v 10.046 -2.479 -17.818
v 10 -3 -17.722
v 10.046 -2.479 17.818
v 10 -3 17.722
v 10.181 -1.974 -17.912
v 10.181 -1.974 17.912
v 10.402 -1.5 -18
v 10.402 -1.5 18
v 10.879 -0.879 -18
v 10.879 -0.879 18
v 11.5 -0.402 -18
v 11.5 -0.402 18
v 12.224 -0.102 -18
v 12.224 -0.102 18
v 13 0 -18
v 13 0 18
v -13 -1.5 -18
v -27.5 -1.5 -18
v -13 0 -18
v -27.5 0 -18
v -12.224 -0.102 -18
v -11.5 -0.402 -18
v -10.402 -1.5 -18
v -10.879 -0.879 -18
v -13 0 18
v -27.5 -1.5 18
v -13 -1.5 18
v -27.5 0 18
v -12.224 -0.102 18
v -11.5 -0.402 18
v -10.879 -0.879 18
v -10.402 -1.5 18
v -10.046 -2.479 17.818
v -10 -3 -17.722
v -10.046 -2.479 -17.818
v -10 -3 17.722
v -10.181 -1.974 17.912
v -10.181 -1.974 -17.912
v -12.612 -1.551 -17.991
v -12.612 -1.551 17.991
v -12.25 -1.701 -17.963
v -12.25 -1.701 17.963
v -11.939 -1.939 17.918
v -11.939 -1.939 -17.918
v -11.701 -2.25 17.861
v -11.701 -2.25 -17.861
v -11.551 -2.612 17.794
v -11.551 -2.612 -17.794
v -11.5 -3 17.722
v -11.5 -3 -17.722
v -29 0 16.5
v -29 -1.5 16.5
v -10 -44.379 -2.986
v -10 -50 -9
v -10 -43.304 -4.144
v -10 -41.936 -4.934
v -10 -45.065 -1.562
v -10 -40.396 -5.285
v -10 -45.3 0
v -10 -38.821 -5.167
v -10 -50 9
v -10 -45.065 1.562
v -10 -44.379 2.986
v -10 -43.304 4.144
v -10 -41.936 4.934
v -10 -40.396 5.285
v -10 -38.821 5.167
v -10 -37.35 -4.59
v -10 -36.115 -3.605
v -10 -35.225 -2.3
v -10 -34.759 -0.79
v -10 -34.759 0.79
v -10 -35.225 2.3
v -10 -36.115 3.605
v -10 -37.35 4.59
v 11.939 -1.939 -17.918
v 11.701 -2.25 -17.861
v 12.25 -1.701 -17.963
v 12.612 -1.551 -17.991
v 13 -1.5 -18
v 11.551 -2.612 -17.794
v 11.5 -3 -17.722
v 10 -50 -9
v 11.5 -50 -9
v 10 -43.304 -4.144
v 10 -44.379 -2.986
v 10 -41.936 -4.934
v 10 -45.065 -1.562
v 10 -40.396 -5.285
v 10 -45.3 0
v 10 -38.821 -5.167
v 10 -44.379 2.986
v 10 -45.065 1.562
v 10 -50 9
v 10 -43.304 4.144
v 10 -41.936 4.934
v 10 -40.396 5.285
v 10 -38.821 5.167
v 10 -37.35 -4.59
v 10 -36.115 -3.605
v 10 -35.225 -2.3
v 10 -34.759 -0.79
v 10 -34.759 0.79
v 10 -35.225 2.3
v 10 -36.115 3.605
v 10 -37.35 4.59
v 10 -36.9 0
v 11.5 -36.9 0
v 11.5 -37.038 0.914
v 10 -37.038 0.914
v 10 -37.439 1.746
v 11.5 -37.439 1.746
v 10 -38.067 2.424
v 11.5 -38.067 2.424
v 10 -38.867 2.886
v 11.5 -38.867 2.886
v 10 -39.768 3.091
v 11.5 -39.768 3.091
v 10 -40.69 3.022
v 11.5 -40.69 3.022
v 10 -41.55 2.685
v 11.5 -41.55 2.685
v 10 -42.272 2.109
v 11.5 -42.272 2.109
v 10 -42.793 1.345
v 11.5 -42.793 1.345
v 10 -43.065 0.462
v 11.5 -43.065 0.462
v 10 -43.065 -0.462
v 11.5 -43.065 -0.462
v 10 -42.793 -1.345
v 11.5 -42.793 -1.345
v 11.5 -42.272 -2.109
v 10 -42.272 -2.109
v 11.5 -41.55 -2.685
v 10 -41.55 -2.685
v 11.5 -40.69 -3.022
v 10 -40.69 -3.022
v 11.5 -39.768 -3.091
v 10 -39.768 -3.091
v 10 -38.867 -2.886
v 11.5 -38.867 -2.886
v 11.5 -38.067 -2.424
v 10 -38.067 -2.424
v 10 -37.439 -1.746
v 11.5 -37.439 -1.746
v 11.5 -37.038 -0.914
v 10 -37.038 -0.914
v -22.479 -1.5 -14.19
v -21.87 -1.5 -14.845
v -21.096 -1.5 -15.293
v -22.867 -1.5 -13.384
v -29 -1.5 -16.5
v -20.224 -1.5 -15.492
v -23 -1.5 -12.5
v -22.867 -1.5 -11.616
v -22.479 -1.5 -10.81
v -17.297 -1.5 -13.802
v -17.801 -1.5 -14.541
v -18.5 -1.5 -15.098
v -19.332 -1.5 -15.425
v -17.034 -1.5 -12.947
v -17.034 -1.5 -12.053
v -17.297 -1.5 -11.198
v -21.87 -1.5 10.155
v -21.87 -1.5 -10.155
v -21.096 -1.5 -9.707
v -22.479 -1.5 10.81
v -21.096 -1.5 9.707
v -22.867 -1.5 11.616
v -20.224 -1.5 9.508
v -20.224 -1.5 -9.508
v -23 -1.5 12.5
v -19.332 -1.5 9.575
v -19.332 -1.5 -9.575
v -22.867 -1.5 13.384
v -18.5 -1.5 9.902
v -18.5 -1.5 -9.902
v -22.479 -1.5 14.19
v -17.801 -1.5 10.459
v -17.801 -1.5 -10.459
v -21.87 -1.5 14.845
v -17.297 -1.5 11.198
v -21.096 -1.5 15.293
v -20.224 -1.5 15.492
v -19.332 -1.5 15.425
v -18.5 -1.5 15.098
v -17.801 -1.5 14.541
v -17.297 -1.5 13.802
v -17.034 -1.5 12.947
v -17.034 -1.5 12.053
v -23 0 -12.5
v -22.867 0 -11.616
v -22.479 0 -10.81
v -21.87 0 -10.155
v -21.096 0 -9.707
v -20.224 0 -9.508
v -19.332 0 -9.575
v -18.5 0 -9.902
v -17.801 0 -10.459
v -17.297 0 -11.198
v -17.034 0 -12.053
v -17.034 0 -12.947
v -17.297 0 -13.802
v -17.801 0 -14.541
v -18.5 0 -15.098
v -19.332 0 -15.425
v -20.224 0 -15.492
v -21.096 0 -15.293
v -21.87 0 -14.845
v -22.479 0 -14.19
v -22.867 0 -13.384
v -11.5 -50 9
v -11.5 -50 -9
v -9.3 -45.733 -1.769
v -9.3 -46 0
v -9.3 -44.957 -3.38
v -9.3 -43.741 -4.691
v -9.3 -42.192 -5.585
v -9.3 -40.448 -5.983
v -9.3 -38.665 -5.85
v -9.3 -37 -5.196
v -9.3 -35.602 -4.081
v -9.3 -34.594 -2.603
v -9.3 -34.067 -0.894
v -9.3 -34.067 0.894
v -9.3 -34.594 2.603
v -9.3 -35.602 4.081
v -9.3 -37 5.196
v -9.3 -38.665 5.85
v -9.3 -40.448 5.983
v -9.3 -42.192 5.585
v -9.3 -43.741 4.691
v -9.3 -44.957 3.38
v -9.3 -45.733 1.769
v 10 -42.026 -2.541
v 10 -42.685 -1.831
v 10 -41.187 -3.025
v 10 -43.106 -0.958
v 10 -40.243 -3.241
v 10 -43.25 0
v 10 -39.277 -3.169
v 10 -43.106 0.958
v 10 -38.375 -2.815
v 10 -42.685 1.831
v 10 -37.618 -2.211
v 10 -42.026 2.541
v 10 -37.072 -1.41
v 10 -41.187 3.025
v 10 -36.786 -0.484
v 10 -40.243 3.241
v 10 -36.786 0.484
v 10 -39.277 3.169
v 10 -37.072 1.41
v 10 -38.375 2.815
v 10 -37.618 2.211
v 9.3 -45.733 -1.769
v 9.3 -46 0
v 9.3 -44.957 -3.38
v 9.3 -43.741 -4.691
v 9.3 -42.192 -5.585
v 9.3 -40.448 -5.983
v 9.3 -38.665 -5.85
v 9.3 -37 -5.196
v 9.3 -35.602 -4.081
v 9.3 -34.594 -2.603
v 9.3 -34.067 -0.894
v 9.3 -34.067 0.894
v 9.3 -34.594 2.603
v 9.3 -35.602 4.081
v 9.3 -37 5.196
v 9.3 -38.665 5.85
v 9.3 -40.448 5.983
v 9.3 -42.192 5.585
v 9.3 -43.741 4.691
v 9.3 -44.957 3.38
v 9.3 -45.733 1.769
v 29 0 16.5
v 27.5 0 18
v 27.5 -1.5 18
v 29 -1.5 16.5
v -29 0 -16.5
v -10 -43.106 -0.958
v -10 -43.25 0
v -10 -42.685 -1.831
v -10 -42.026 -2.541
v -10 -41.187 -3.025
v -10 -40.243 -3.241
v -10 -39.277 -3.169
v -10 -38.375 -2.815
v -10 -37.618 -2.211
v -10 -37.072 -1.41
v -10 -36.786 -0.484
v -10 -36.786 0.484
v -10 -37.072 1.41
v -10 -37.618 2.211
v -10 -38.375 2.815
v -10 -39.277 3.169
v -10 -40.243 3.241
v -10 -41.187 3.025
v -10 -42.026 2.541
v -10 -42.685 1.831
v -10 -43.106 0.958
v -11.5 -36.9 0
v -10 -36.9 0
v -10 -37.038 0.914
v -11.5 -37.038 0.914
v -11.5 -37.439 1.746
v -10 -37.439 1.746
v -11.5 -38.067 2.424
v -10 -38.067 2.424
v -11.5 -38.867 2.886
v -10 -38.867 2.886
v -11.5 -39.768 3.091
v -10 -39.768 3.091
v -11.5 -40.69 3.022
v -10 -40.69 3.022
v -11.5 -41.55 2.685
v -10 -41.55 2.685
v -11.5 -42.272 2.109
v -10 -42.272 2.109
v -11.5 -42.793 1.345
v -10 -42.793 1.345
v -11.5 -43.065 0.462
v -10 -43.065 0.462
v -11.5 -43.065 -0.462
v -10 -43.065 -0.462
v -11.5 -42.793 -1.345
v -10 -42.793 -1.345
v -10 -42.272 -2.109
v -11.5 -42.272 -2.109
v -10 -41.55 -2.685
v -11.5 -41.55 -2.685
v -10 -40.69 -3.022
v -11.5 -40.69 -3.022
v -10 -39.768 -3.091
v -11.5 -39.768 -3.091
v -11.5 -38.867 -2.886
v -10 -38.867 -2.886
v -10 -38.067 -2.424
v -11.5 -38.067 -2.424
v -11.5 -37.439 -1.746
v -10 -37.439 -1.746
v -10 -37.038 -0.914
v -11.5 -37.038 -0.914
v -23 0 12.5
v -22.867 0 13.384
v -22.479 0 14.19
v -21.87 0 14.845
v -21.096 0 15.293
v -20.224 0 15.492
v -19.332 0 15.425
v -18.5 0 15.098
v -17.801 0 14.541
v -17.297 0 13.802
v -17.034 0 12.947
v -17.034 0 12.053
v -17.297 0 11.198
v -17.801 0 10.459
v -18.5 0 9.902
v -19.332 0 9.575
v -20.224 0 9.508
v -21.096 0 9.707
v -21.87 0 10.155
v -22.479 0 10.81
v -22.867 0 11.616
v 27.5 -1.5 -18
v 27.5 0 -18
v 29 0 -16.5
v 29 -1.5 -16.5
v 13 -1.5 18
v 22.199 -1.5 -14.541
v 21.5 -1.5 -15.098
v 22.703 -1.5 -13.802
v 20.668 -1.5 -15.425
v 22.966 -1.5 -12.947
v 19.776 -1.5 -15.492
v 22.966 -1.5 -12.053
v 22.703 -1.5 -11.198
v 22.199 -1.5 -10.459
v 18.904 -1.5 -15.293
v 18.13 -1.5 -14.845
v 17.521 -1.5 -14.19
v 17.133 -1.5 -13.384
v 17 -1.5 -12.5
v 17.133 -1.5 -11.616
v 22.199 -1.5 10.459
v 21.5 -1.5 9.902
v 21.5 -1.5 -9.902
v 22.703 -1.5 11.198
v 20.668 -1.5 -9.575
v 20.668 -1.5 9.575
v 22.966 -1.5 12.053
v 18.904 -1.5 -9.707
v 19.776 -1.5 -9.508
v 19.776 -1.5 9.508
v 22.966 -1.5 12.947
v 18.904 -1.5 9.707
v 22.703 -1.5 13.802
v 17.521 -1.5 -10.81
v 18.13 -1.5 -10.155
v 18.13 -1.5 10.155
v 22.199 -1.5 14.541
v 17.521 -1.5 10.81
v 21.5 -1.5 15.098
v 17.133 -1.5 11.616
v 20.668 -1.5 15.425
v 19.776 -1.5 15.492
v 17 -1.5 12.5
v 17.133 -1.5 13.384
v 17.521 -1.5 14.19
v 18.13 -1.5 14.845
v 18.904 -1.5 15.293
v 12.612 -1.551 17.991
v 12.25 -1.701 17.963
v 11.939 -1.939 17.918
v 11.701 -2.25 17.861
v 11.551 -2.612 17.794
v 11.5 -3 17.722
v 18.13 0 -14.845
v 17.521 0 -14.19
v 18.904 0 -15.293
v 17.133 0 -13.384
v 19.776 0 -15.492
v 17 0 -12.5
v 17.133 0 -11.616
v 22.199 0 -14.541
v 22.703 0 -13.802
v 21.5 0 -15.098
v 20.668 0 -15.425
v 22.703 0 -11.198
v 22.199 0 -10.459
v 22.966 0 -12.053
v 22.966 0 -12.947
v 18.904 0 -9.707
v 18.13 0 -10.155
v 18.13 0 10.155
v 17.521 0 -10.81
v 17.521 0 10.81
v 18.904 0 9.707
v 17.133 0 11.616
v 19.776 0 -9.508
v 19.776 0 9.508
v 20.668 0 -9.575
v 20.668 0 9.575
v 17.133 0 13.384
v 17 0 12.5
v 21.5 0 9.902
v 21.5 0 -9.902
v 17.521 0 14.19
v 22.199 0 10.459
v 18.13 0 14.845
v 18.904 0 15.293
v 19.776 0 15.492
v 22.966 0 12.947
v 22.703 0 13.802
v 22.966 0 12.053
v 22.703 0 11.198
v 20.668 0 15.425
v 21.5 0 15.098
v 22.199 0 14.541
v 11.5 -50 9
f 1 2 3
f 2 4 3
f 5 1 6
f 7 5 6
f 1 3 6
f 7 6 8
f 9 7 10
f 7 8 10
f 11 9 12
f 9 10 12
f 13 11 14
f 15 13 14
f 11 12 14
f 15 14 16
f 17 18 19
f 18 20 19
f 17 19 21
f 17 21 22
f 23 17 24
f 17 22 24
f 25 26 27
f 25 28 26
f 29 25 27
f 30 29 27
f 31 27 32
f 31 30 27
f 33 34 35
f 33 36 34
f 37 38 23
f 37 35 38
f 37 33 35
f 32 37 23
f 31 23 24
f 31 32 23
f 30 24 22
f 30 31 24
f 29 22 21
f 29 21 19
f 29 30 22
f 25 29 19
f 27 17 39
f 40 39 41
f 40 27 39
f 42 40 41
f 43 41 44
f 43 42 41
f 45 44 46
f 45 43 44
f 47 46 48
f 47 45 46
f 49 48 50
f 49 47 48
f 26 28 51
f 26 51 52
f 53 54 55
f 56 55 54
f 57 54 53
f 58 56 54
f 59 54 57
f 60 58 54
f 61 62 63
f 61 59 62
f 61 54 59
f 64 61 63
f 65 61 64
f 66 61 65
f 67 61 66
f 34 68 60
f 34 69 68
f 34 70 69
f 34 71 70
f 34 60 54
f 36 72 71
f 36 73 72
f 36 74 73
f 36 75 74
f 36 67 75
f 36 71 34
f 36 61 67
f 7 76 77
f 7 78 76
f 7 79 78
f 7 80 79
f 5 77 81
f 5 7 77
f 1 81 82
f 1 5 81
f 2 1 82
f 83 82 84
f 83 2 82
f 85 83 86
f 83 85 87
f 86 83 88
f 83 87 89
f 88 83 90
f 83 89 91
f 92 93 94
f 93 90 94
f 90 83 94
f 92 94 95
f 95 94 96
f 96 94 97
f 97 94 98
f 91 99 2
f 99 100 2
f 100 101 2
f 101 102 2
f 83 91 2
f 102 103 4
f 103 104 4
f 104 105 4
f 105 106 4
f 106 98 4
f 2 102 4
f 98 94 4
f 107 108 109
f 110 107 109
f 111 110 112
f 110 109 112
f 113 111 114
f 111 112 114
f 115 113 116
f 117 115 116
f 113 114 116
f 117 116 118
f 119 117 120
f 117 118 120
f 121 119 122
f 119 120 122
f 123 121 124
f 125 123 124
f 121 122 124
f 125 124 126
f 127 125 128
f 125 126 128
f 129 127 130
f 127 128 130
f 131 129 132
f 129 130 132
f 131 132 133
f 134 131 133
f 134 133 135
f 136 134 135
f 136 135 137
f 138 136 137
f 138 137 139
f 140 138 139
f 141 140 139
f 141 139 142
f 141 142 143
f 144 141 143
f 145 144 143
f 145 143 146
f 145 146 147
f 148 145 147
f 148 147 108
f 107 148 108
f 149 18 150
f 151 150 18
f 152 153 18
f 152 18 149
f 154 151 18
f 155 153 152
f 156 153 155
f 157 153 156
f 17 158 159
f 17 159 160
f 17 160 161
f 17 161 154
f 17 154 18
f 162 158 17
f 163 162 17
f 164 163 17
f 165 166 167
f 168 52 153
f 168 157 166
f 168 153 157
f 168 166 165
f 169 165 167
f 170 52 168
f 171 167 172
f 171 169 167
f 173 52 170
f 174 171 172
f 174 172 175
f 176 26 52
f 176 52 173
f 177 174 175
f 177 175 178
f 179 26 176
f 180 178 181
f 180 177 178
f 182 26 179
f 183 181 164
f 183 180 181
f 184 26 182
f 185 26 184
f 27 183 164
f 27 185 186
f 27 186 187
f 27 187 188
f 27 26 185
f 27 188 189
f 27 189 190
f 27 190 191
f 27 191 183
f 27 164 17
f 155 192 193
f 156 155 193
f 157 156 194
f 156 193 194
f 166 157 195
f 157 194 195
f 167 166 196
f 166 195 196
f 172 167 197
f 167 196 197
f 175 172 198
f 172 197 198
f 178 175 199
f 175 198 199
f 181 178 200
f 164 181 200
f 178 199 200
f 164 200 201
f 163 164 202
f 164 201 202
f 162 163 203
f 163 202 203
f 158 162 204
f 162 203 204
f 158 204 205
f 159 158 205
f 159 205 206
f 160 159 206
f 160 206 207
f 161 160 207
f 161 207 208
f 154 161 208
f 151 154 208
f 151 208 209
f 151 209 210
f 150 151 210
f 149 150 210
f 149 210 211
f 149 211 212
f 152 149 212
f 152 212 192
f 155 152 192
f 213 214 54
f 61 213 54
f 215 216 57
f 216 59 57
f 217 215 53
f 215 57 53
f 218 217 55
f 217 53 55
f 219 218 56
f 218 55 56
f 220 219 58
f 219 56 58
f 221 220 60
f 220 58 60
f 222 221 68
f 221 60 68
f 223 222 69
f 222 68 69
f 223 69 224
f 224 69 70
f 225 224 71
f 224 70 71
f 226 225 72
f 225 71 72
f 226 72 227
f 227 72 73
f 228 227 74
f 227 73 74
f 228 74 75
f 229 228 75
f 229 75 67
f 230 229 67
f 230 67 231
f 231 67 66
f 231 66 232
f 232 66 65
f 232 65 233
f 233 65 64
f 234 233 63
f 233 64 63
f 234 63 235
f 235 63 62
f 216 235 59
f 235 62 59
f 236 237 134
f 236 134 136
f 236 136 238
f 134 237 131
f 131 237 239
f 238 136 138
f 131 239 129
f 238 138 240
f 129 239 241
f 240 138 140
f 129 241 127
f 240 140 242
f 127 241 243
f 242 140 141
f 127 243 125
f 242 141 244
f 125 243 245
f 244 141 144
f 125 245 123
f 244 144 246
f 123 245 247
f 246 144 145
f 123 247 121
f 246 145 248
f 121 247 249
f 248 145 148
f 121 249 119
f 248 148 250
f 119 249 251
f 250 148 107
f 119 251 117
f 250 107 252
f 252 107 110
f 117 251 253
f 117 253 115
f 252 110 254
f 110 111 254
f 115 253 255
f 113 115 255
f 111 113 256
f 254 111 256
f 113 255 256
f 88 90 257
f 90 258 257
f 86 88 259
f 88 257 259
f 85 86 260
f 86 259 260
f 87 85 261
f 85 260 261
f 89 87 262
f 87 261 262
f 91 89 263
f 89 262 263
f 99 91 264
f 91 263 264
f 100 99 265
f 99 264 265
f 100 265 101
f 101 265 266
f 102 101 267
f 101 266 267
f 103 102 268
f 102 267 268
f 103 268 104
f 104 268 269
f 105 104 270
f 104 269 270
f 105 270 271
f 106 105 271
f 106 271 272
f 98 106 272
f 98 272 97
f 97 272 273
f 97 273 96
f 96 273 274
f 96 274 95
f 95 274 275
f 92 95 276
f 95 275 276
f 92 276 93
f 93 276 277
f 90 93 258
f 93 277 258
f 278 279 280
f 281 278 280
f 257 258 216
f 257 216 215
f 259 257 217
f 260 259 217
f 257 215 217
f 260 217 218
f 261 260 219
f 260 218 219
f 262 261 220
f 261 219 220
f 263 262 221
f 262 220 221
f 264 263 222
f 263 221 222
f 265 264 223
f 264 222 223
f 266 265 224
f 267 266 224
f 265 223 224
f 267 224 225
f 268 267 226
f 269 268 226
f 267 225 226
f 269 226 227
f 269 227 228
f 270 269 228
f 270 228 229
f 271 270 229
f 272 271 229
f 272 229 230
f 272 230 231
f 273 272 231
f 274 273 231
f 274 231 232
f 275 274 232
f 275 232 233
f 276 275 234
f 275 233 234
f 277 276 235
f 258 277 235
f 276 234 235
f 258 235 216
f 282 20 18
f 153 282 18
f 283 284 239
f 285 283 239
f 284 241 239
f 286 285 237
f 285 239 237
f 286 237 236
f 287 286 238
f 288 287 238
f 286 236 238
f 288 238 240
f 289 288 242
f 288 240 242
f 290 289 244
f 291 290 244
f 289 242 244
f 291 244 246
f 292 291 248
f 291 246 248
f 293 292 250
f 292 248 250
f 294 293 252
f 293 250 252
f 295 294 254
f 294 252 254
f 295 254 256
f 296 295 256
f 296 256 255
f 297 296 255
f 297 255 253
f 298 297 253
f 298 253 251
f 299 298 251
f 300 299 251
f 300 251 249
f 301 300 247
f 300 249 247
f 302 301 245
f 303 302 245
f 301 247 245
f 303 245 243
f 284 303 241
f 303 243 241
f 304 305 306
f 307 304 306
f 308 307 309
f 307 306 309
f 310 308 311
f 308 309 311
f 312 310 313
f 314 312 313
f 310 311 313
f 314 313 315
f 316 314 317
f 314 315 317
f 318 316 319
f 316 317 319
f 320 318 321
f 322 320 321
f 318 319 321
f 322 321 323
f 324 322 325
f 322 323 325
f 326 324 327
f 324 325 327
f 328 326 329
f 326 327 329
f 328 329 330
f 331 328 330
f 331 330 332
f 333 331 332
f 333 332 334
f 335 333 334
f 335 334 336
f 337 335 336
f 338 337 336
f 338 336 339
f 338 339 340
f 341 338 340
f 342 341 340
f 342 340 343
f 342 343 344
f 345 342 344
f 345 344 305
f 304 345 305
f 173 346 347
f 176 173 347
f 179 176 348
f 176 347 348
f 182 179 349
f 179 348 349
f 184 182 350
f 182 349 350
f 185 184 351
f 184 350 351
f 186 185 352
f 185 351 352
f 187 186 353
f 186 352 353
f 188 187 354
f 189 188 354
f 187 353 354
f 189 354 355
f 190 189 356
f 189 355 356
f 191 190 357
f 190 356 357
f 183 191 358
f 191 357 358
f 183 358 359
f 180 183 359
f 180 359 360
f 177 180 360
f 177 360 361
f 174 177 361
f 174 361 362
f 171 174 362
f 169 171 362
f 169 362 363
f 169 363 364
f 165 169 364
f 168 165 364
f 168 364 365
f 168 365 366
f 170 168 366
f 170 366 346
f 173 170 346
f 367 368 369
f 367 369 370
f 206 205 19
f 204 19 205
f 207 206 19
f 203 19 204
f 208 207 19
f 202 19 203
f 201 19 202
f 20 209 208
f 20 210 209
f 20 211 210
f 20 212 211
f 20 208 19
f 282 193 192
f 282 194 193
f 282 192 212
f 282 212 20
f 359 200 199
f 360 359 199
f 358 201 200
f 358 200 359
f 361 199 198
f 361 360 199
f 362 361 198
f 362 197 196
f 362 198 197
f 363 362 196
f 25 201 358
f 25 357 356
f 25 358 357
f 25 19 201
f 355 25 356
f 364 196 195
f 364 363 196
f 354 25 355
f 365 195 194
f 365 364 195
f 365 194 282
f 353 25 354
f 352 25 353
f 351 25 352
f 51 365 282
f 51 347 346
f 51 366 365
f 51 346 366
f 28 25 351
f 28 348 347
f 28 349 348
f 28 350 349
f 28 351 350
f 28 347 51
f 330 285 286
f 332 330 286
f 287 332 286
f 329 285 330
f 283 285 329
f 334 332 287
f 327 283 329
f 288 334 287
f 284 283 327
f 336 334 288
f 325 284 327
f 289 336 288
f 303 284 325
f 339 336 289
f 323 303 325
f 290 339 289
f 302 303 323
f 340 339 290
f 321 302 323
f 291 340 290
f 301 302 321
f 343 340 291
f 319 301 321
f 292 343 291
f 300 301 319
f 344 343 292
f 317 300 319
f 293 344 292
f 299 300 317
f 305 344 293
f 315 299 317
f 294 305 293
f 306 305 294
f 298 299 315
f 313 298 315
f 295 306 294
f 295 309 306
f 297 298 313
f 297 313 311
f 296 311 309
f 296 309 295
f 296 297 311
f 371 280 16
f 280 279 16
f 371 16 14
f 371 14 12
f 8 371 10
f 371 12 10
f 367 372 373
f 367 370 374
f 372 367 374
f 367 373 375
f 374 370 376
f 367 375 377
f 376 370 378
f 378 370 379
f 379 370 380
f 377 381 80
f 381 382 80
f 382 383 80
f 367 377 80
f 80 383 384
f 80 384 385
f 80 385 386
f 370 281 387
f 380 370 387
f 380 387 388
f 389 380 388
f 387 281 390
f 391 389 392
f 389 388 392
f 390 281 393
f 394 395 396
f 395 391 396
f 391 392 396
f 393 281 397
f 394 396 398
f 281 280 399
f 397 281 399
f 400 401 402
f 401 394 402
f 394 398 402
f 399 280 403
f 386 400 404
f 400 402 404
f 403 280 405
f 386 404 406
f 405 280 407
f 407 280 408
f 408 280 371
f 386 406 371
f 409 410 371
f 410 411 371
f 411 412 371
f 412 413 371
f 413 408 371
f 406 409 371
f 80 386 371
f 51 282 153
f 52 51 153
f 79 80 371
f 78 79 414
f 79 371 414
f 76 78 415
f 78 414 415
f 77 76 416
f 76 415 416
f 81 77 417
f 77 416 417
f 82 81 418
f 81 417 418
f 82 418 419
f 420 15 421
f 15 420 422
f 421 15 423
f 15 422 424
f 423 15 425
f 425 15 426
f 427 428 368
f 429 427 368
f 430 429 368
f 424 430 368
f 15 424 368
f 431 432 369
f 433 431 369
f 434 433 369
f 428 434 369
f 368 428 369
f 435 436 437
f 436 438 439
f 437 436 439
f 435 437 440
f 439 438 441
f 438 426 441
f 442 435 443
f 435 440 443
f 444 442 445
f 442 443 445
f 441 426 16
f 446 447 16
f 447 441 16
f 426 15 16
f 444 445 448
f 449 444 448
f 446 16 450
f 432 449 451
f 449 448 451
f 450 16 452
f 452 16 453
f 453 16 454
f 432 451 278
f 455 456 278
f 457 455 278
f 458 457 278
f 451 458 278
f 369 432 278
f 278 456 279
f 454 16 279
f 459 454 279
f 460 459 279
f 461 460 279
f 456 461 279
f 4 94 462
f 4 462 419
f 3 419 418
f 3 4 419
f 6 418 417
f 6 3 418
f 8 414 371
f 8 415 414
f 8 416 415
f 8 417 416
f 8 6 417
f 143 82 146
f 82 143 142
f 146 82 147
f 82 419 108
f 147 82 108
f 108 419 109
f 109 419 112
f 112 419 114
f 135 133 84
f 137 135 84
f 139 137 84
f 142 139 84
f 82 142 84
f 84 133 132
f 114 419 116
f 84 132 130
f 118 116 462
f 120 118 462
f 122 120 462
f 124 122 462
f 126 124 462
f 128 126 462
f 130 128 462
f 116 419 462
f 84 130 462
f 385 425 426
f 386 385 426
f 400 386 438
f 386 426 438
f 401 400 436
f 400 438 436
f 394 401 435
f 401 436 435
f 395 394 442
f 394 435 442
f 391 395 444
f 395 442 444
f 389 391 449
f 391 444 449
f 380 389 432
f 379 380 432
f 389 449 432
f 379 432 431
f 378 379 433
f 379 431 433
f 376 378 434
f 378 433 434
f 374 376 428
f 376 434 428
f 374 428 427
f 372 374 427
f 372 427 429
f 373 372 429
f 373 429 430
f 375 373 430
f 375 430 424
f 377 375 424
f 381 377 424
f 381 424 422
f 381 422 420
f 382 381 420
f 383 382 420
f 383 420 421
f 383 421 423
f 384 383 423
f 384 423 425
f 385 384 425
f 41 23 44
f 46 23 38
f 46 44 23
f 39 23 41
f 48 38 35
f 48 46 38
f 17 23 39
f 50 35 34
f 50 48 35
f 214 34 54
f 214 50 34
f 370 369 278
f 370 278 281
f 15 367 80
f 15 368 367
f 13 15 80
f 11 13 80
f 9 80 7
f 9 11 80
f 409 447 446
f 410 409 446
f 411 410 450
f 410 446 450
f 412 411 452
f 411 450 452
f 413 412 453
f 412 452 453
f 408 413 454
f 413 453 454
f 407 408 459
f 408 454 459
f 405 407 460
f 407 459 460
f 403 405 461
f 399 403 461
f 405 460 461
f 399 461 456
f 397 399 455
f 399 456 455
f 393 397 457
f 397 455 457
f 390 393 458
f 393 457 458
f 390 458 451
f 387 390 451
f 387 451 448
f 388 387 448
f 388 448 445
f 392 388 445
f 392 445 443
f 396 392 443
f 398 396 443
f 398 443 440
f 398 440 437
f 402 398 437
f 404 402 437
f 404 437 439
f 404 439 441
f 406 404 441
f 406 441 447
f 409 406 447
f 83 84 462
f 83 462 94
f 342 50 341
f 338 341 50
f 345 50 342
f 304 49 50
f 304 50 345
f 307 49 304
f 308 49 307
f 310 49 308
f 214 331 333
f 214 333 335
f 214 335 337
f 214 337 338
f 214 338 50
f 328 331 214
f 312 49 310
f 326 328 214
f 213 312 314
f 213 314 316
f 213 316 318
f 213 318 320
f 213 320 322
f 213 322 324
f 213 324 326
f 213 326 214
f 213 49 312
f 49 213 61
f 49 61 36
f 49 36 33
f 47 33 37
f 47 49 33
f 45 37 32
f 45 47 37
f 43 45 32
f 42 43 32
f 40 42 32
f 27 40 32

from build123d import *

# Parameters (mm, degrees)
BOSS_EXTRUDE1_DEPTH     = 18
BOSS_EXTRUDE1_2_DEPTH   = 18
CUT_EXTRUDE1_DEPTH      = 61.539243471
CUT_EXTRUDE1_DEPTH_BACK = 61.539243471
SKETCH3_R               = 3.1
CUT_EXTRUDE2_DEPTH      = 67.815043216
SKETCH5_R               = 3
CUT_EXTRUDE3_DEPTH      = 61.539243471
CHAMFER1_SIZE           = 1.5


with BuildPart() as part:
    # Sketch1 → Boss-Extrude1 (new, symmetric)
    with BuildSketch(Plane.XY):
        with BuildLine():
            Line((-13, 0), (-29, 0))
            Line((-29, 0), (-29, -1.5))
            Line((-29, -1.5), (-13, -1.5))
            ThreePointArc((-13, -1.5), (-11.939339828, -1.939339828), (-11.5, -3))
            Line((-11.5, -3), (-11.5, -50))
            Line((-11.5, -50), (-10, -50))
            Line((-10, -50), (-10, -3))
            ThreePointArc((-10, -3), (-10.878679656, -0.878679656), (-13, 0))
        make_face()
    extrude(amount=BOSS_EXTRUDE1_DEPTH, both=True)


with BuildPart() as body_2:
    # Sketch1 → Boss-Extrude1 2 (new, symmetric)
    with BuildSketch(Plane.XY):
        with BuildLine():
            Line((11.5, -50), (10, -50))
            Line((10, -50), (10, -3))
            ThreePointArc((10, -3), (10.878679656, -0.878679656), (13, 0))
            Line((13, 0), (29, 0))
            Line((29, 0), (29, -1.5))
            Line((29, -1.5), (13, -1.5))
            ThreePointArc((13, -1.5), (11.939339828, -1.939339828), (11.5, -3))
            Line((11.5, -3), (11.5, -50))
        make_face()
    extrude(amount=BOSS_EXTRUDE1_2_DEPTH, both=True)


with BuildPart() as cut_extrude1_tool:
    # Sketch2 → Cut-Extrude1 (new, two sides: drawn at the far end of the back side and taken through both)
    with BuildSketch(Plane(origin=(0, 0, 0), x_dir=(0, 0, -1), z_dir=(1, 0, 0)).offset(-CUT_EXTRUDE1_DEPTH_BACK)):
        Polygon((-18, -50), (-9, -50), (-18, -1.5), align=None)
        Polygon((9, -50), (18, -50), (18, -1.5), align=None)
    extrude(amount=CUT_EXTRUDE1_DEPTH + CUT_EXTRUDE1_DEPTH_BACK)


with BuildPart() as part_1:
    add(part.part)

    # Cut-Extrude1: cut by cut_extrude1_tool
    add(cut_extrude1_tool.part, mode=Mode.SUBTRACT)


with BuildPart() as body_2_1:
    add(body_2.part)

    # Cut-Extrude1: cut by cut_extrude1_tool
    add(cut_extrude1_tool.part, mode=Mode.SUBTRACT)


with BuildPart() as cut_extrude2_tool:
    # Sketch3 → Cut-Extrude2 (new, through all)
    with BuildSketch(Plane(origin=(11.5, 0, 0), x_dir=(0, 0, -1), z_dir=(1, 0, 0))):
        with Locations(Location((0, -40, 0), (0, 0, 90))):
            Circle(SKETCH3_R)
    extrude(amount=-CUT_EXTRUDE2_DEPTH)


with BuildPart() as part_2:
    add(part_1.part)

    # Cut-Extrude2: cut by cut_extrude2_tool
    add(cut_extrude2_tool.part, mode=Mode.SUBTRACT)



with BuildPart() as body_2_2:
    add(body_2_1.part)

    # Cut-Extrude2: cut by cut_extrude2_tool
    add(cut_extrude2_tool.part, mode=Mode.SUBTRACT)


with BuildPart() as part_3:
    add(part_2.part)

    add(body_2_2.part)  # Revolve1 merges body 2
    # Sketch4 → Revolve1 (revolve)
    with BuildSketch(Plane.XY, mode=Mode.PRIVATE) as revolve1_sk:
        Polygon((-10, -36.75), (10, -36.75), (10, -34.7), (9.3, -34), (-9.3, -34), (-10, -34.7), align=None)
    revolve(revolve1_sk.sketch.rotate(Axis((-10, -40, 0), (1, 0, 0)), 180), axis=Axis((-10, -40, 0), (1, 0, 0)))

    # Sketch5 → Cut-Extrude3 (cut, through all)
    with BuildSketch(Plane(origin=(0, 0, 0), x_dir=(1, 0, 0), z_dir=(0, 1, 0))):
        with Locations(Location((-20, 12.5, 0), (0, 0, 180))):
            Circle(SKETCH5_R)
        with Locations(Location((-20, -12.5, 0), (0, 0, 180))):
            Circle(SKETCH5_R)
        with Locations(Location((20, 12.5, 0), (0, 0, 180))):
            Circle(SKETCH5_R)
        with Locations(Location((20, -12.5, 0), (0, 0, 180))):
            Circle(SKETCH5_R)
    extrude(amount=-CUT_EXTRUDE3_DEPTH, mode=Mode.SUBTRACT)

    # Chamfer1
    chamfer1_edges = [part_3.edges().sort_by_distance(p)[0] for p in [
        (-29, -0.75, 18),
        (29, -0.75, -18),
        (29, -0.75, 18),
        (-29, -0.75, -18),
    ]]
    chamfer(chamfer1_edges, length=CHAMFER1_SIZE)


solid = part_3.part
